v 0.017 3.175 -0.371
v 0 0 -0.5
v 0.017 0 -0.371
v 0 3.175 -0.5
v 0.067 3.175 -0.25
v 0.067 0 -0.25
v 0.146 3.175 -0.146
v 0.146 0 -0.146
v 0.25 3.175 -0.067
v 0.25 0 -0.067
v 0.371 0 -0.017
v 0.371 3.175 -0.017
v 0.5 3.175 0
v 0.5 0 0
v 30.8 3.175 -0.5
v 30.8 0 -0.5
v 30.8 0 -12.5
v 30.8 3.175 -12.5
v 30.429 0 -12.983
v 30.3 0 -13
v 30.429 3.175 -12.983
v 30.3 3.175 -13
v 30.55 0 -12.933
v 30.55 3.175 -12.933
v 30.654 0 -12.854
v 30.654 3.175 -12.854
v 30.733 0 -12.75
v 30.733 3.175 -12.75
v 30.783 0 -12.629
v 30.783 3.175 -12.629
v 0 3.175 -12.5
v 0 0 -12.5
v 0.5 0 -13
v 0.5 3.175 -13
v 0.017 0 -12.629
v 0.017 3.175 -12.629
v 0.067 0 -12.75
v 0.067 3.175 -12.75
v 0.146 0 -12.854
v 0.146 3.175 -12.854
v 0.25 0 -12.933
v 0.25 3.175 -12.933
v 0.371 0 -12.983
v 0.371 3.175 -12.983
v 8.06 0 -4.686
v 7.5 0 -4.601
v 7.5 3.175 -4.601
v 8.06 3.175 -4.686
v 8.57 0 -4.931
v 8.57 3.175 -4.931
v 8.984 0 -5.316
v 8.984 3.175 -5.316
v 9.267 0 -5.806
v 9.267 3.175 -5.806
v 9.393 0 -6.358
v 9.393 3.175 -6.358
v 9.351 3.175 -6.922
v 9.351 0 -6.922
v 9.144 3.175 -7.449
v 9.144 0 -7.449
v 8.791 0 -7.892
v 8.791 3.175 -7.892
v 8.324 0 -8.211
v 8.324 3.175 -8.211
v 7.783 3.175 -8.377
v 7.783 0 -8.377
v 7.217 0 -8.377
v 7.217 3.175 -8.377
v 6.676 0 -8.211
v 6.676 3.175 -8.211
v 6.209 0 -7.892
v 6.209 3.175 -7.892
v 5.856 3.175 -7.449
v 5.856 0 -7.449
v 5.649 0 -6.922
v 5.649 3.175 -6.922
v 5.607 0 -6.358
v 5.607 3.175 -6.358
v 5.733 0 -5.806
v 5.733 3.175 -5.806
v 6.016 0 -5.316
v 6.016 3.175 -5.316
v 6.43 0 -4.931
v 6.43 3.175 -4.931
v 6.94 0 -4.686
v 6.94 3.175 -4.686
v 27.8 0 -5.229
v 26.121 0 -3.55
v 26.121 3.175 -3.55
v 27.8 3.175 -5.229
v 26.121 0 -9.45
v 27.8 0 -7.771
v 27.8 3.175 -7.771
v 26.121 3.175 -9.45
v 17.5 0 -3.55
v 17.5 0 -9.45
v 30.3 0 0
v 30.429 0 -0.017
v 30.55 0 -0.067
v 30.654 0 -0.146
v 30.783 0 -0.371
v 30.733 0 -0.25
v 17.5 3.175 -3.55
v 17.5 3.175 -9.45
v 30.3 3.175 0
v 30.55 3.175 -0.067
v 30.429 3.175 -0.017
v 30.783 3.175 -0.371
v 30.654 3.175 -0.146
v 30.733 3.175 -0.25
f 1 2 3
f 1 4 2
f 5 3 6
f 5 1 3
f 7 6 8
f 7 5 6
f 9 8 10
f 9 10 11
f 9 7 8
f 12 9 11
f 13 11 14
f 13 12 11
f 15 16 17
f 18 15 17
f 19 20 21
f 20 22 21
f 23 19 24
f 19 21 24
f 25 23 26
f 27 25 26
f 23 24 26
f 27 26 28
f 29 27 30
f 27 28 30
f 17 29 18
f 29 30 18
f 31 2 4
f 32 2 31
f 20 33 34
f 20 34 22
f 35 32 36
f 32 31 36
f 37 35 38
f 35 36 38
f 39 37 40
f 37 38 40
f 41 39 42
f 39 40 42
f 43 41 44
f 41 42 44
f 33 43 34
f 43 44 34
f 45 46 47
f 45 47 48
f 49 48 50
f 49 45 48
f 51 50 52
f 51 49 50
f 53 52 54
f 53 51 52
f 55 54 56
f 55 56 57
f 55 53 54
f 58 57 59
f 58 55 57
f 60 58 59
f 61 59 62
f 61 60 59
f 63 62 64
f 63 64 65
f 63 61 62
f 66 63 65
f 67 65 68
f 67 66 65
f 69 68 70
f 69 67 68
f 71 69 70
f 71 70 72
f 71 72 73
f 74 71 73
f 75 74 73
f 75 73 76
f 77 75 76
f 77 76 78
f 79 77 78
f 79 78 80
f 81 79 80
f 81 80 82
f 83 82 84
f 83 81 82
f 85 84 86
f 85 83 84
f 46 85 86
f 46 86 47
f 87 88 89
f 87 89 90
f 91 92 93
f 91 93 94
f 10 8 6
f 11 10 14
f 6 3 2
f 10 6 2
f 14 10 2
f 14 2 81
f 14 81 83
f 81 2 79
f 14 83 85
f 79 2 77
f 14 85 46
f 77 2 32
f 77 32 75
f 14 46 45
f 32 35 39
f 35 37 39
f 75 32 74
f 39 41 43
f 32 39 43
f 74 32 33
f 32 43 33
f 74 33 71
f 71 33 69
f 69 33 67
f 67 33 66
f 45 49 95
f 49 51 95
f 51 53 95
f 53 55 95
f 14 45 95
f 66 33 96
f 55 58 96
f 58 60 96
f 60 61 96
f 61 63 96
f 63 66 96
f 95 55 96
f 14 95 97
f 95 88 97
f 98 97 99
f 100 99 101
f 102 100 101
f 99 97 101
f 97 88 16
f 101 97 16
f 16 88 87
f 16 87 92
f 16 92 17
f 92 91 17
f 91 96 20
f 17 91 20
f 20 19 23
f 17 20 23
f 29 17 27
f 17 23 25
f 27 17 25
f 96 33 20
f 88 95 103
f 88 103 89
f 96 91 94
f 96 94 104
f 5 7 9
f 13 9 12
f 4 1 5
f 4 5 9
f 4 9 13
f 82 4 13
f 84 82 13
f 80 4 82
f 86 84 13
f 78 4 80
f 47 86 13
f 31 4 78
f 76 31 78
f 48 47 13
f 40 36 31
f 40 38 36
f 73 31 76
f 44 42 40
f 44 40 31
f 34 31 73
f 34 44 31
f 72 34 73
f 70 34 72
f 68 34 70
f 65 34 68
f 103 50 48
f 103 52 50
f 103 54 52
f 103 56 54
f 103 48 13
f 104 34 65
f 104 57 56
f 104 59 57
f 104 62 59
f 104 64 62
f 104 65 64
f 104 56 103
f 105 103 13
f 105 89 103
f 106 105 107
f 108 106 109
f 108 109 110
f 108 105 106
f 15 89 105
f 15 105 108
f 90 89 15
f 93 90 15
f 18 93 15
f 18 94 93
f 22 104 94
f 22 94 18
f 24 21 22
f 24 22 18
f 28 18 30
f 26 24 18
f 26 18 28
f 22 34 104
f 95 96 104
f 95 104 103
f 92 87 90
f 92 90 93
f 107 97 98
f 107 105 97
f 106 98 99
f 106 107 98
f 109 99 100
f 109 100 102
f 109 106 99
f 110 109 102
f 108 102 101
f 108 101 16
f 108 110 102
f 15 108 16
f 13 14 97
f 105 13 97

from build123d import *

# Parameters (mm, degrees)
SKETCH1_W           = 30.8
SKETCH1_H           = 13
SKETCH1_R           = 1.89865
BOSS_EXTRUDE1_DEPTH = 3.175
FILLET1_R           = 0.5


with BuildPart() as part:
    # Sketch1 → Boss-Extrude1 (new body)
    with BuildSketch(Plane(origin=(0, 0, 0), x_dir=(1, 0, 0), z_dir=(0, 1, 0))):
        with Locations((15.4, 6.5)):
            Rectangle(SKETCH1_W, SKETCH1_H)
        with Locations(Location((7.5, 6.5, 0), (0, 0, 270))):
            Circle(SKETCH1_R, mode=Mode.SUBTRACT)
        Polygon((27.8, 5.229289322), (27.8, 7.770710678), (26.120710678, 9.45), (17.5, 9.45), (17.5, 3.55), (26.120710678, 3.55), align=None, mode=Mode.SUBTRACT)
    extrude(amount=BOSS_EXTRUDE1_DEPTH)

    # Fillet1
    fillet1_edges = [part.edges().sort_by_distance(p)[0] for p in [
        (0, 1.5875, -13),
        (30.8, 1.5875, -13),
        (30.8, 1.5875, 0),
        (0, 1.5875, 0),
    ]]
    fillet(fillet1_edges, radius=FILLET1_R)


solid = part.part
